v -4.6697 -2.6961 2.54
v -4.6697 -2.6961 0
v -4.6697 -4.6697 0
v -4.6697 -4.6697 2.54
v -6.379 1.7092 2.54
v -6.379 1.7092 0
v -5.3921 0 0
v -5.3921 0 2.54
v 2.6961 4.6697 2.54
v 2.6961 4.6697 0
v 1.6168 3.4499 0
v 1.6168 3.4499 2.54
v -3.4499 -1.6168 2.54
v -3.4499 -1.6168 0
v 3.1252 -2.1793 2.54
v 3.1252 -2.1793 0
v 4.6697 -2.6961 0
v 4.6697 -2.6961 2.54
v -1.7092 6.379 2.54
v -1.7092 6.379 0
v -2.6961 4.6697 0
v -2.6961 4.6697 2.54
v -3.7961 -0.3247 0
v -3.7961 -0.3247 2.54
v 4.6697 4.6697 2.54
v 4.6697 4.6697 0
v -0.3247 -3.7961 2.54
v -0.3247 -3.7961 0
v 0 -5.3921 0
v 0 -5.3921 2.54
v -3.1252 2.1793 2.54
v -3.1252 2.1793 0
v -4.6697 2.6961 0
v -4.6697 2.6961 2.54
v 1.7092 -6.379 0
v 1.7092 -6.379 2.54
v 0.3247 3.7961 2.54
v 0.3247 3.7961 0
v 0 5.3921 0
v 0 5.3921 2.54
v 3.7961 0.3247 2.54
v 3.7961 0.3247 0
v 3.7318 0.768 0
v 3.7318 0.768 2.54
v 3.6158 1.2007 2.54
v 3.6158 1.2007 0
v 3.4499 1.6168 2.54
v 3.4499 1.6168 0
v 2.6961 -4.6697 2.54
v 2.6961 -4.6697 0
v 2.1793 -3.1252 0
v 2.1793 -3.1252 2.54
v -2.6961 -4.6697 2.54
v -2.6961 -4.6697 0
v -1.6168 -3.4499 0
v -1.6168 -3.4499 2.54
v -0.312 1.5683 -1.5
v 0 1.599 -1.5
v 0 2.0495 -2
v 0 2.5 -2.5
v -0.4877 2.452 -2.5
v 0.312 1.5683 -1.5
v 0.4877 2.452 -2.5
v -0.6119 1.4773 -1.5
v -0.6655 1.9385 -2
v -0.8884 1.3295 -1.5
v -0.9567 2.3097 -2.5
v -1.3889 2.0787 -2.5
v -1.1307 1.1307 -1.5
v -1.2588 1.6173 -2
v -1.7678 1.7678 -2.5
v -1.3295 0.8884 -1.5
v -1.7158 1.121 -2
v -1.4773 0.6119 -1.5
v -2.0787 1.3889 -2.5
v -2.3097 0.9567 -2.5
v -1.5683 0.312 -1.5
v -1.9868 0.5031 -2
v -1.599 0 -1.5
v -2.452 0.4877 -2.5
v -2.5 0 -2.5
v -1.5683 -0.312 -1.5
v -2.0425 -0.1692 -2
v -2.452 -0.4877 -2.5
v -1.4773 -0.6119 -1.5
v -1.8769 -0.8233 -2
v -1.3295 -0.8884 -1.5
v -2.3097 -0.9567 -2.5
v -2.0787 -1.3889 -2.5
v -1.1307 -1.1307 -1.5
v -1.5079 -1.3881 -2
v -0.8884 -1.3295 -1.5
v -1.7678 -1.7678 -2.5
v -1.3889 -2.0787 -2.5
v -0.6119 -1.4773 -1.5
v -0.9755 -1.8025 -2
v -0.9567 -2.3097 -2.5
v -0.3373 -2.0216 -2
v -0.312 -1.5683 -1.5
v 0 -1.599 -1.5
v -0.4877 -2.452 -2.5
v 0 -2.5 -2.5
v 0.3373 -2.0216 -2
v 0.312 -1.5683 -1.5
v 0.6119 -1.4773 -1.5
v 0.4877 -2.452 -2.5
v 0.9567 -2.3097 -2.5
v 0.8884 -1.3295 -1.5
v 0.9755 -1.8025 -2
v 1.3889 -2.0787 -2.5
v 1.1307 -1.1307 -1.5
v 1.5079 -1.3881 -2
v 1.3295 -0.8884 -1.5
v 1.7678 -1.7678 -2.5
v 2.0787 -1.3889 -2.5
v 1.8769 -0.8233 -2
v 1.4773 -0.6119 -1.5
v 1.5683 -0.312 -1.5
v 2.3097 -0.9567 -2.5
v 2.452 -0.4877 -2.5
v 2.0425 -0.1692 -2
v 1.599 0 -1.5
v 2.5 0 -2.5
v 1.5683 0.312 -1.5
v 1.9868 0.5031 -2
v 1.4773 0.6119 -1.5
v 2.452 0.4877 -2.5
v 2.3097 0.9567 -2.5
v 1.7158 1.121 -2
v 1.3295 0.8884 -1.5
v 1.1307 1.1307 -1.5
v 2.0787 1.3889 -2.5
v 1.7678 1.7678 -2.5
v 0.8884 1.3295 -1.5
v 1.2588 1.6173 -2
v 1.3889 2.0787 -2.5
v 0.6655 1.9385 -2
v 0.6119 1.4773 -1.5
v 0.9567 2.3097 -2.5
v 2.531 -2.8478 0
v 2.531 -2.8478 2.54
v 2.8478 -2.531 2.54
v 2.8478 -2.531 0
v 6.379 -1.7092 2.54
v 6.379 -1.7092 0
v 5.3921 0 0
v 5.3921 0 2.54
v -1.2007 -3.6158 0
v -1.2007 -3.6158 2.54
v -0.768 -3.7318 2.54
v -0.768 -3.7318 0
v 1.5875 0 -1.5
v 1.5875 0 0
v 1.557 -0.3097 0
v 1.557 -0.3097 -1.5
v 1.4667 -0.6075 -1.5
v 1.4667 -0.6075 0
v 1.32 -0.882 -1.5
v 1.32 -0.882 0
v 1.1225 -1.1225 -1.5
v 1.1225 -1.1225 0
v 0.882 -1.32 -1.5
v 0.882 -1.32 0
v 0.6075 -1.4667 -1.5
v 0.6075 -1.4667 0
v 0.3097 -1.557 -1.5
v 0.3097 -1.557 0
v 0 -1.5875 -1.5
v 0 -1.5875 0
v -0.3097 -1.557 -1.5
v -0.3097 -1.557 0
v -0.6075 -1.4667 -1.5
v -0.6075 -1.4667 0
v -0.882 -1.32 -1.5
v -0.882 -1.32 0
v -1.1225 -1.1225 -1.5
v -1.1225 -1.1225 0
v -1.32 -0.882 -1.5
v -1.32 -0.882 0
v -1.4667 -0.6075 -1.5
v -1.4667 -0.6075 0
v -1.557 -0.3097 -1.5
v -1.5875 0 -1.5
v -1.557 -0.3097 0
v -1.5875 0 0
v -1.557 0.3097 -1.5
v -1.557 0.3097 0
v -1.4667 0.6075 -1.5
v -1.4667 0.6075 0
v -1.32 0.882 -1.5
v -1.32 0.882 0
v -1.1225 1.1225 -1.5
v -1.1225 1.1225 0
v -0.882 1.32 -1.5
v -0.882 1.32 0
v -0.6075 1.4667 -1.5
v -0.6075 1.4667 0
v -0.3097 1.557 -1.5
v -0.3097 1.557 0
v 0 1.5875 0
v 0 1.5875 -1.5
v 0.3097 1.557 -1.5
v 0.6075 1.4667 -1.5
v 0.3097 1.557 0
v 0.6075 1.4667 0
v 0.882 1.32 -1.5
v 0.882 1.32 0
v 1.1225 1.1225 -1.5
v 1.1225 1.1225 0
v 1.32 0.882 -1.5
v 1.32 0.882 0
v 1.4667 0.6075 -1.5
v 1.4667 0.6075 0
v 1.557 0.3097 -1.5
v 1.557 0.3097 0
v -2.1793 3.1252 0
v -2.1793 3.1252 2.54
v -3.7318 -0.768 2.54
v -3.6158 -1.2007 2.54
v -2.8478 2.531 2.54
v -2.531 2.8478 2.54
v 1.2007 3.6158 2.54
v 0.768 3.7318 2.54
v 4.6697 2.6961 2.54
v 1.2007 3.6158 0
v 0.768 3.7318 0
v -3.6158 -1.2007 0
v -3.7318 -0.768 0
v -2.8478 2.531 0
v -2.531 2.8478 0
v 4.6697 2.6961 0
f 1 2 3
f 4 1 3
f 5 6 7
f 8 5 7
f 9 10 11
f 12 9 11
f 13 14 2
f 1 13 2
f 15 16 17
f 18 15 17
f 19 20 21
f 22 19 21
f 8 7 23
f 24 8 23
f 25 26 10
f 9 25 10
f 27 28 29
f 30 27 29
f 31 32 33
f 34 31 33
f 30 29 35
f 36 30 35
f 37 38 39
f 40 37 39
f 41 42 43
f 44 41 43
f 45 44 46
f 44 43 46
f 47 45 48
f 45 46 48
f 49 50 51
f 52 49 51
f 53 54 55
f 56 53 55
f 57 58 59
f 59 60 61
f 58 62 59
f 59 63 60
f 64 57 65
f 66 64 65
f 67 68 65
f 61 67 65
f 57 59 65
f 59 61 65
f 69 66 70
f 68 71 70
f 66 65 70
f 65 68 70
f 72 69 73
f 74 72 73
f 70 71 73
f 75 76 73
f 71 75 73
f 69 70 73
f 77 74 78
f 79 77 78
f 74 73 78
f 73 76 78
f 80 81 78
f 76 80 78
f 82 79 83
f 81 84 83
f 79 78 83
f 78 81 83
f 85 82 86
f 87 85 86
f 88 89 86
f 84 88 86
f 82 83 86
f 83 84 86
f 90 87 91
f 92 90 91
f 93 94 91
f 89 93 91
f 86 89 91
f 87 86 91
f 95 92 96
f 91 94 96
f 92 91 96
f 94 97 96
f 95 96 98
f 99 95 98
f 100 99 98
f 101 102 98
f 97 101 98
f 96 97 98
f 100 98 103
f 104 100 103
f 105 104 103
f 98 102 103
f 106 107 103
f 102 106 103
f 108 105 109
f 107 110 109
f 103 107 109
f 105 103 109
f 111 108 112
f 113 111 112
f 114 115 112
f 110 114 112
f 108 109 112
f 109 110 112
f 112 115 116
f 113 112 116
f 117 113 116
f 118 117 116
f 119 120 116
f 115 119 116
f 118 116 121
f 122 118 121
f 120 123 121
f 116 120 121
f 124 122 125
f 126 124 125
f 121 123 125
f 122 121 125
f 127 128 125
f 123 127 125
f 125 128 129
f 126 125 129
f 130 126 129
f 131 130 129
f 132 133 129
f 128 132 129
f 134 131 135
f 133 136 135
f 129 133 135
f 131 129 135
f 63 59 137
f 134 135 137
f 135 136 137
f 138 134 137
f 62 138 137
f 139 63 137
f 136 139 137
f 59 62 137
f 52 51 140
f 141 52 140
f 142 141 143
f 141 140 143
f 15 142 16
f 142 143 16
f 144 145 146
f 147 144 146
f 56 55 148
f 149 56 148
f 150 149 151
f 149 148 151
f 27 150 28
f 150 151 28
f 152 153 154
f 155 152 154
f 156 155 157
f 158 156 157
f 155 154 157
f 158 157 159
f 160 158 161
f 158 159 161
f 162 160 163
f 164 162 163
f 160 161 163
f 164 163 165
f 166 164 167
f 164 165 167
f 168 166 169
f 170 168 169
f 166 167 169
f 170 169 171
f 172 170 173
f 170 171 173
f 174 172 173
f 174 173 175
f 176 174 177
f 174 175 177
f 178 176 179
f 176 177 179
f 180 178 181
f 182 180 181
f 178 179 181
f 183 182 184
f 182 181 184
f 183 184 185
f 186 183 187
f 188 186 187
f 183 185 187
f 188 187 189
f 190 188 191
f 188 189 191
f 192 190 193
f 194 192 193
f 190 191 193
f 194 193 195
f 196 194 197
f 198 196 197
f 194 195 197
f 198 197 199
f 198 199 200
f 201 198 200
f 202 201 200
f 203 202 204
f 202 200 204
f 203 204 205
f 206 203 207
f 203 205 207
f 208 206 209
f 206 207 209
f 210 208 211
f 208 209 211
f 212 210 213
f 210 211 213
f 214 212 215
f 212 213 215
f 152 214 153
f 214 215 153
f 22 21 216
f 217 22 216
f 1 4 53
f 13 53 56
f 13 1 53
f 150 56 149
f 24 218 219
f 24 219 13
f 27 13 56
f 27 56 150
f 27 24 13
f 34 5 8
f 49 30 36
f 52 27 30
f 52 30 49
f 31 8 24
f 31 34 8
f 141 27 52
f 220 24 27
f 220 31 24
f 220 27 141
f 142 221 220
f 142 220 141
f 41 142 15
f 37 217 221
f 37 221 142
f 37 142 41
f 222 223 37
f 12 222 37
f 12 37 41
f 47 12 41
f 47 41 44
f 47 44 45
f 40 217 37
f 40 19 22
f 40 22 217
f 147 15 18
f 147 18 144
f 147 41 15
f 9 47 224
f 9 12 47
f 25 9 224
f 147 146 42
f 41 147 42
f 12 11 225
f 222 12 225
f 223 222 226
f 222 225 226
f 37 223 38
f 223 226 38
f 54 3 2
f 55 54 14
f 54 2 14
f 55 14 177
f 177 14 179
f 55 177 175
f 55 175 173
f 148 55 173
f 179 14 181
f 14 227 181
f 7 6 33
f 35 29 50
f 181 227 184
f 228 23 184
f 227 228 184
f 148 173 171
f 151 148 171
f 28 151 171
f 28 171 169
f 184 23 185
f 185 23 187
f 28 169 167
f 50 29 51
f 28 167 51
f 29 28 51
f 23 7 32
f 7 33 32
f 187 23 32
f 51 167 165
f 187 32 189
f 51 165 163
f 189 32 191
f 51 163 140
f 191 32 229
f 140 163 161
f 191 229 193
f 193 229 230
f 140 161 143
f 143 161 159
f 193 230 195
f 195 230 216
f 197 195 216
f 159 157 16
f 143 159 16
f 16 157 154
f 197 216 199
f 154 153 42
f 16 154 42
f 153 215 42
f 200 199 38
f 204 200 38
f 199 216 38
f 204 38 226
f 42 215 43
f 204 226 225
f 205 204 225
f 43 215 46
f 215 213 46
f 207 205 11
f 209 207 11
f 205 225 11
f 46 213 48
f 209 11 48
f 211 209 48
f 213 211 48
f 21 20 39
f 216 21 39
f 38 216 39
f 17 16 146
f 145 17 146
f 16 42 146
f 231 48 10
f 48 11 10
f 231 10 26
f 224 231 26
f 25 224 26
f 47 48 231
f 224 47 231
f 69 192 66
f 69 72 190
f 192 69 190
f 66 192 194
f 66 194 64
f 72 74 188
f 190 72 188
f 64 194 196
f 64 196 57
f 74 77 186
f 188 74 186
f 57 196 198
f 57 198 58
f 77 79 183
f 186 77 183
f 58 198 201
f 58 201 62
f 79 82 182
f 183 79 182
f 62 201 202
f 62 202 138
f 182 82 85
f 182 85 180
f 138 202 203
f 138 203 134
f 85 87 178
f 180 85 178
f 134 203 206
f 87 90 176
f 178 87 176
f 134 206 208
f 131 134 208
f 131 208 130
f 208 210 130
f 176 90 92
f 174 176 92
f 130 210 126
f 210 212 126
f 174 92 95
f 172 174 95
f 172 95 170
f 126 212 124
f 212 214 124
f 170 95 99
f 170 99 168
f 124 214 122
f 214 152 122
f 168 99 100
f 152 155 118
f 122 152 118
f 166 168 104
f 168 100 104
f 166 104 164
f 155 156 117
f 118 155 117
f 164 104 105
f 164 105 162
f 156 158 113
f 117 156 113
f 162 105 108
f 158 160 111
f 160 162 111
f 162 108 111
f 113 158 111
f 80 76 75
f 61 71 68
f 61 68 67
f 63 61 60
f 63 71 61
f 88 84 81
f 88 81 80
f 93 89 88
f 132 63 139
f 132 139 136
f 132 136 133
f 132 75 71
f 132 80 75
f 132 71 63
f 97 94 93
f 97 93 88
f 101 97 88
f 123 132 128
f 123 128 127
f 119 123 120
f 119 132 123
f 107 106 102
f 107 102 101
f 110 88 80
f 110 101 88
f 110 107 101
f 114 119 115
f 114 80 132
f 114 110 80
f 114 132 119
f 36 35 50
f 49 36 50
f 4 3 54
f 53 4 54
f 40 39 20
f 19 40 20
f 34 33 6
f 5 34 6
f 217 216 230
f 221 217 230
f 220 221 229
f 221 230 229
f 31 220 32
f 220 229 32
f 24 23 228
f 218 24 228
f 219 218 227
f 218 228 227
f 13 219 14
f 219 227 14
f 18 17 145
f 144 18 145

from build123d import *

# Parameters (mm, degrees)
F1_DEPTH = 2.54
F2_R     = 1.5875
F3_DEPTH = 1.5
F4_R     = 2.5
F5_DEPTH = 1


with BuildPart() as f1:
    # F0 (on Top) → F1 (new body)
    with BuildSketch(Plane.XY):
        with BuildLine():
            ThreePointArc((1.6168332291, 3.4499203338), (1.7625208147, 3.3778129578), (1.905, 3.2995567884))
            ThreePointArc((1.905, 3.2995567884), (2.6940768363, 2.6940768363), (3.2995567884, 1.905))
            ThreePointArc((3.2995567884, 1.905), (3.3778129578, 1.7625208147), (3.4499203338, 1.6168332291))
            Line((3.4499203338, 1.6168332291), (4.669733183, 2.6960717102))
            Line((4.669733183, 2.6960717102), (4.669733183, 4.669733183))
            Line((4.669733183, 4.669733183), (2.6960717102, 4.669733183))
            Line((2.6960717102, 4.669733183), (1.6168332291, 3.4499203338))
        make_face()
        with BuildLine():
            Line((1.905, 3.2995567884), (0, 0))
            Line((0, 0), (3.2995567884, 1.905))
            ThreePointArc((3.2995567884, 1.905), (2.6940768363, 2.6940768363), (1.905, 3.2995567884))
        make_face()
        with BuildLine():
            ThreePointArc((0.3247415168, 3.7961352646), (0.1625186786, 3.806532238), (0, 3.81))
            Line((0, 3.81), (0, 0))
            Line((0, 0), (1.905, 3.2995567884))
            ThreePointArc((1.905, 3.2995567884), (1.7625208147, 3.3778129578), (1.6168332291, 3.4499203338))
            ThreePointArc((1.6168332291, 3.4499203338), (0.9861005618, 3.6801773982), (0.3247415168, 3.7961352646))
        make_face()
        with BuildLine():
            ThreePointArc((-1.905, 3.2995567884), (-0.9861005618, 3.6801773982), (0, 3.81))
            ThreePointArc((0, 3.81), (0.1625186786, 3.806532238), (0.3247415168, 3.7961352646))
            Line((0.3247415168, 3.7961352646), (0, 5.3921434204))
            Line((0, 5.3921434204), (-1.7092409739, 6.3789741568))
            Line((-1.7092409739, 6.3789741568), (-2.6960717102, 4.669733183))
            Line((-2.6960717102, 4.669733183), (-2.1793020355, 3.125178817))
            ThreePointArc((-2.1793020355, 3.125178817), (-2.0440114233, 3.2152942791), (-1.905, 3.2995567884))
        make_face()
        with BuildLine():
            Line((0, 0), (0, 3.81))
            ThreePointArc((0, 3.81), (-0.9861005618, 3.6801773982), (-1.905, 3.2995567884))
            Line((-1.905, 3.2995567884), (0, 0))
        make_face()
        with BuildLine():
            Line((-3.2995567884, 1.905), (0, 0))
            Line((0, 0), (-1.905, 3.2995567884))
            ThreePointArc((-1.905, 3.2995567884), (-2.0440114233, 3.2152942791), (-2.1793020355, 3.125178817))
            ThreePointArc((-2.1793020355, 3.125178817), (-2.6940768363, 2.6940768363), (-3.125178817, 2.1793020355))
            ThreePointArc((-3.125178817, 2.1793020355), (-3.2152942791, 2.0440114233), (-3.2995567884, 1.905))
        make_face()
        with BuildLine():
            ThreePointArc((-3.7961352646, -0.3247415168), (-3.806532238, -0.1625186786), (-3.81, 0))
            ThreePointArc((-3.81, 0), (-3.6801773982, 0.9861005618), (-3.2995567884, 1.905))
            ThreePointArc((-3.2995567884, 1.905), (-3.2152942791, 2.0440114233), (-3.125178817, 2.1793020355))
            Line((-3.125178817, 2.1793020355), (-4.669733183, 2.6960717102))
            Line((-4.669733183, 2.6960717102), (-6.3789741568, 1.7092409739))
            Line((-6.3789741568, 1.7092409739), (-5.3921434204, 0))
            Line((-5.3921434204, 0), (-3.7961352646, -0.3247415168))
        make_face()
        with BuildLine():
            Line((-3.81, 0), (0, 0))
            Line((0, 0), (-3.2995567884, 1.905))
            ThreePointArc((-3.2995567884, 1.905), (-3.6801773982, 0.9861005618), (-3.81, 0))
        make_face()
        with BuildLine():
            Line((-3.2995567884, -1.905), (0, 0))
            Line((0, 0), (-3.81, 0))
            ThreePointArc((-3.81, 0), (-3.806532238, -0.1625186786), (-3.7961352646, -0.3247415168))
            ThreePointArc((-3.7961352646, -0.3247415168), (-3.6801773982, -0.9861005618), (-3.4499203338, -1.6168332291))
            ThreePointArc((-3.4499203338, -1.6168332291), (-3.3778129578, -1.7625208147), (-3.2995567884, -1.905))
        make_face()
        with BuildLine():
            Line((-1.905, -3.2995567884), (0, 0))
            Line((0, 0), (-3.2995567884, -1.905))
            ThreePointArc((-3.2995567884, -1.905), (-2.6940768363, -2.6940768363), (-1.905, -3.2995567884))
        make_face()
        with BuildLine():
            ThreePointArc((-1.6168332291, -3.4499203338), (-1.7625208147, -3.3778129578), (-1.905, -3.2995567884))
            ThreePointArc((-1.905, -3.2995567884), (-2.6940768363, -2.6940768363), (-3.2995567884, -1.905))
            ThreePointArc((-3.2995567884, -1.905), (-3.3778129578, -1.7625208147), (-3.4499203338, -1.6168332291))
            Line((-3.4499203338, -1.6168332291), (-4.669733183, -2.6960717102))
            Line((-4.669733183, -2.6960717102), (-4.669733183, -4.669733183))
            Line((-4.669733183, -4.669733183), (-2.6960717102, -4.669733183))
            Line((-2.6960717102, -4.669733183), (-1.6168332291, -3.4499203338))
        make_face()
        with BuildLine():
            Line((0, -3.81), (0, 0))
            Line((0, 0), (-1.905, -3.2995567884))
            ThreePointArc((-1.905, -3.2995567884), (-1.7625208147, -3.3778129578), (-1.6168332291, -3.4499203338))
            ThreePointArc((-1.6168332291, -3.4499203338), (-0.9861005618, -3.6801773982), (-0.3247415168, -3.7961352646))
            ThreePointArc((-0.3247415168, -3.7961352646), (-0.1625186786, -3.806532238), (0, -3.81))
        make_face()
        with BuildLine():
            ThreePointArc((1.905, -3.2995567884), (0.9861005618, -3.6801773982), (0, -3.81))
            Line((0, -3.81), (0, -5.3921434204))
            Line((0, -5.3921434204), (1.7092409739, -6.3789741568))
            Line((1.7092409739, -6.3789741568), (2.6960717102, -4.669733183))
            Line((2.6960717102, -4.669733183), (2.1793020355, -3.125178817))
            ThreePointArc((2.1793020355, -3.125178817), (2.0440114233, -3.2152942791), (1.905, -3.2995567884))
        make_face()
        with BuildLine():
            Line((1.905, -3.2995567884), (0, 0))
            Line((0, 0), (0, -3.81))
            ThreePointArc((0, -3.81), (0.9861005618, -3.6801773982), (1.905, -3.2995567884))
        make_face()
        with BuildLine():
            Line((3.2995567884, -1.905), (0, 0))
            Line((0, 0), (1.905, -3.2995567884))
            ThreePointArc((1.905, -3.2995567884), (2.0440114233, -3.2152942791), (2.1793020355, -3.125178817))
            ThreePointArc((2.1793020355, -3.125178817), (2.6940768363, -2.6940768363), (3.125178817, -2.1793020355))
            ThreePointArc((3.125178817, -2.1793020355), (3.2152942791, -2.0440114233), (3.2995567884, -1.905))
        make_face()
        with BuildLine():
            Line((3.81, 0), (0, 0))
            Line((0, 0), (3.2995567884, -1.905))
            ThreePointArc((3.2995567884, -1.905), (3.6801773982, -0.9861005618), (3.81, 0))
        make_face()
        with BuildLine():
            Line((3.2995567884, 1.905), (0, 0))
            Line((0, 0), (3.81, 0))
            ThreePointArc((3.81, 0), (3.806532238, 0.1625186786), (3.7961352646, 0.3247415168))
            ThreePointArc((3.7961352646, 0.3247415168), (3.6801773982, 0.9861005618), (3.4499203338, 1.6168332291))
            ThreePointArc((3.4499203338, 1.6168332291), (3.3778129578, 1.7625208147), (3.2995567884, 1.905))
        make_face()
        with BuildLine():
            ThreePointArc((3.7961352646, 0.3247415168), (3.806532238, 0.1625186786), (3.81, 0))
            ThreePointArc((3.81, 0), (3.6801773982, -0.9861005618), (3.2995567884, -1.905))
            ThreePointArc((3.2995567884, -1.905), (3.2152942791, -2.0440114233), (3.125178817, -2.1793020355))
            Line((3.125178817, -2.1793020355), (4.669733183, -2.6960717102))
            Line((4.669733183, -2.6960717102), (6.3789741568, -1.7092409739))
            Line((6.3789741568, -1.7092409739), (5.3921434204, 0))
            Line((5.3921434204, 0), (3.7961352646, 0.3247415168))
        make_face()
        with BuildLine():
            Line((0, -5.3921434204), (0, -3.81))
            ThreePointArc((0, -3.81), (-0.1625186786, -3.806532238), (-0.3247415168, -3.7961352646))
            Line((-0.3247415168, -3.7961352646), (0, -5.3921434204))
        make_face()
    extrude(amount=F1_DEPTH)

    # F2 (on face) → F3 (join)
    with BuildSketch(Plane(origin=(0, 0, 0), x_dir=(1, 0, 0), z_dir=(0, 0, -1))):
        Circle(F2_R)
    extrude(amount=F3_DEPTH)

    # F4 (on face) → F5 (join)
    with BuildSketch(Plane(origin=(0, 0, -1.5), x_dir=(1, 0, 0), z_dir=(0, 0, -1))):
        Circle(F4_R)
    extrude(amount=F5_DEPTH)

    # F6 (on Right) → F7 (revolve, cut)
    with BuildSketch(Plane.YZ):
        Polygon((1.7, -1.5), (1.5990135726, -1.5), (2.5, -2.5), (2.5, -1.5), align=None)
    revolve(axis=Axis((0, 0, -2), (0, 0, 1)), mode=Mode.SUBTRACT)


solid = f1.part
